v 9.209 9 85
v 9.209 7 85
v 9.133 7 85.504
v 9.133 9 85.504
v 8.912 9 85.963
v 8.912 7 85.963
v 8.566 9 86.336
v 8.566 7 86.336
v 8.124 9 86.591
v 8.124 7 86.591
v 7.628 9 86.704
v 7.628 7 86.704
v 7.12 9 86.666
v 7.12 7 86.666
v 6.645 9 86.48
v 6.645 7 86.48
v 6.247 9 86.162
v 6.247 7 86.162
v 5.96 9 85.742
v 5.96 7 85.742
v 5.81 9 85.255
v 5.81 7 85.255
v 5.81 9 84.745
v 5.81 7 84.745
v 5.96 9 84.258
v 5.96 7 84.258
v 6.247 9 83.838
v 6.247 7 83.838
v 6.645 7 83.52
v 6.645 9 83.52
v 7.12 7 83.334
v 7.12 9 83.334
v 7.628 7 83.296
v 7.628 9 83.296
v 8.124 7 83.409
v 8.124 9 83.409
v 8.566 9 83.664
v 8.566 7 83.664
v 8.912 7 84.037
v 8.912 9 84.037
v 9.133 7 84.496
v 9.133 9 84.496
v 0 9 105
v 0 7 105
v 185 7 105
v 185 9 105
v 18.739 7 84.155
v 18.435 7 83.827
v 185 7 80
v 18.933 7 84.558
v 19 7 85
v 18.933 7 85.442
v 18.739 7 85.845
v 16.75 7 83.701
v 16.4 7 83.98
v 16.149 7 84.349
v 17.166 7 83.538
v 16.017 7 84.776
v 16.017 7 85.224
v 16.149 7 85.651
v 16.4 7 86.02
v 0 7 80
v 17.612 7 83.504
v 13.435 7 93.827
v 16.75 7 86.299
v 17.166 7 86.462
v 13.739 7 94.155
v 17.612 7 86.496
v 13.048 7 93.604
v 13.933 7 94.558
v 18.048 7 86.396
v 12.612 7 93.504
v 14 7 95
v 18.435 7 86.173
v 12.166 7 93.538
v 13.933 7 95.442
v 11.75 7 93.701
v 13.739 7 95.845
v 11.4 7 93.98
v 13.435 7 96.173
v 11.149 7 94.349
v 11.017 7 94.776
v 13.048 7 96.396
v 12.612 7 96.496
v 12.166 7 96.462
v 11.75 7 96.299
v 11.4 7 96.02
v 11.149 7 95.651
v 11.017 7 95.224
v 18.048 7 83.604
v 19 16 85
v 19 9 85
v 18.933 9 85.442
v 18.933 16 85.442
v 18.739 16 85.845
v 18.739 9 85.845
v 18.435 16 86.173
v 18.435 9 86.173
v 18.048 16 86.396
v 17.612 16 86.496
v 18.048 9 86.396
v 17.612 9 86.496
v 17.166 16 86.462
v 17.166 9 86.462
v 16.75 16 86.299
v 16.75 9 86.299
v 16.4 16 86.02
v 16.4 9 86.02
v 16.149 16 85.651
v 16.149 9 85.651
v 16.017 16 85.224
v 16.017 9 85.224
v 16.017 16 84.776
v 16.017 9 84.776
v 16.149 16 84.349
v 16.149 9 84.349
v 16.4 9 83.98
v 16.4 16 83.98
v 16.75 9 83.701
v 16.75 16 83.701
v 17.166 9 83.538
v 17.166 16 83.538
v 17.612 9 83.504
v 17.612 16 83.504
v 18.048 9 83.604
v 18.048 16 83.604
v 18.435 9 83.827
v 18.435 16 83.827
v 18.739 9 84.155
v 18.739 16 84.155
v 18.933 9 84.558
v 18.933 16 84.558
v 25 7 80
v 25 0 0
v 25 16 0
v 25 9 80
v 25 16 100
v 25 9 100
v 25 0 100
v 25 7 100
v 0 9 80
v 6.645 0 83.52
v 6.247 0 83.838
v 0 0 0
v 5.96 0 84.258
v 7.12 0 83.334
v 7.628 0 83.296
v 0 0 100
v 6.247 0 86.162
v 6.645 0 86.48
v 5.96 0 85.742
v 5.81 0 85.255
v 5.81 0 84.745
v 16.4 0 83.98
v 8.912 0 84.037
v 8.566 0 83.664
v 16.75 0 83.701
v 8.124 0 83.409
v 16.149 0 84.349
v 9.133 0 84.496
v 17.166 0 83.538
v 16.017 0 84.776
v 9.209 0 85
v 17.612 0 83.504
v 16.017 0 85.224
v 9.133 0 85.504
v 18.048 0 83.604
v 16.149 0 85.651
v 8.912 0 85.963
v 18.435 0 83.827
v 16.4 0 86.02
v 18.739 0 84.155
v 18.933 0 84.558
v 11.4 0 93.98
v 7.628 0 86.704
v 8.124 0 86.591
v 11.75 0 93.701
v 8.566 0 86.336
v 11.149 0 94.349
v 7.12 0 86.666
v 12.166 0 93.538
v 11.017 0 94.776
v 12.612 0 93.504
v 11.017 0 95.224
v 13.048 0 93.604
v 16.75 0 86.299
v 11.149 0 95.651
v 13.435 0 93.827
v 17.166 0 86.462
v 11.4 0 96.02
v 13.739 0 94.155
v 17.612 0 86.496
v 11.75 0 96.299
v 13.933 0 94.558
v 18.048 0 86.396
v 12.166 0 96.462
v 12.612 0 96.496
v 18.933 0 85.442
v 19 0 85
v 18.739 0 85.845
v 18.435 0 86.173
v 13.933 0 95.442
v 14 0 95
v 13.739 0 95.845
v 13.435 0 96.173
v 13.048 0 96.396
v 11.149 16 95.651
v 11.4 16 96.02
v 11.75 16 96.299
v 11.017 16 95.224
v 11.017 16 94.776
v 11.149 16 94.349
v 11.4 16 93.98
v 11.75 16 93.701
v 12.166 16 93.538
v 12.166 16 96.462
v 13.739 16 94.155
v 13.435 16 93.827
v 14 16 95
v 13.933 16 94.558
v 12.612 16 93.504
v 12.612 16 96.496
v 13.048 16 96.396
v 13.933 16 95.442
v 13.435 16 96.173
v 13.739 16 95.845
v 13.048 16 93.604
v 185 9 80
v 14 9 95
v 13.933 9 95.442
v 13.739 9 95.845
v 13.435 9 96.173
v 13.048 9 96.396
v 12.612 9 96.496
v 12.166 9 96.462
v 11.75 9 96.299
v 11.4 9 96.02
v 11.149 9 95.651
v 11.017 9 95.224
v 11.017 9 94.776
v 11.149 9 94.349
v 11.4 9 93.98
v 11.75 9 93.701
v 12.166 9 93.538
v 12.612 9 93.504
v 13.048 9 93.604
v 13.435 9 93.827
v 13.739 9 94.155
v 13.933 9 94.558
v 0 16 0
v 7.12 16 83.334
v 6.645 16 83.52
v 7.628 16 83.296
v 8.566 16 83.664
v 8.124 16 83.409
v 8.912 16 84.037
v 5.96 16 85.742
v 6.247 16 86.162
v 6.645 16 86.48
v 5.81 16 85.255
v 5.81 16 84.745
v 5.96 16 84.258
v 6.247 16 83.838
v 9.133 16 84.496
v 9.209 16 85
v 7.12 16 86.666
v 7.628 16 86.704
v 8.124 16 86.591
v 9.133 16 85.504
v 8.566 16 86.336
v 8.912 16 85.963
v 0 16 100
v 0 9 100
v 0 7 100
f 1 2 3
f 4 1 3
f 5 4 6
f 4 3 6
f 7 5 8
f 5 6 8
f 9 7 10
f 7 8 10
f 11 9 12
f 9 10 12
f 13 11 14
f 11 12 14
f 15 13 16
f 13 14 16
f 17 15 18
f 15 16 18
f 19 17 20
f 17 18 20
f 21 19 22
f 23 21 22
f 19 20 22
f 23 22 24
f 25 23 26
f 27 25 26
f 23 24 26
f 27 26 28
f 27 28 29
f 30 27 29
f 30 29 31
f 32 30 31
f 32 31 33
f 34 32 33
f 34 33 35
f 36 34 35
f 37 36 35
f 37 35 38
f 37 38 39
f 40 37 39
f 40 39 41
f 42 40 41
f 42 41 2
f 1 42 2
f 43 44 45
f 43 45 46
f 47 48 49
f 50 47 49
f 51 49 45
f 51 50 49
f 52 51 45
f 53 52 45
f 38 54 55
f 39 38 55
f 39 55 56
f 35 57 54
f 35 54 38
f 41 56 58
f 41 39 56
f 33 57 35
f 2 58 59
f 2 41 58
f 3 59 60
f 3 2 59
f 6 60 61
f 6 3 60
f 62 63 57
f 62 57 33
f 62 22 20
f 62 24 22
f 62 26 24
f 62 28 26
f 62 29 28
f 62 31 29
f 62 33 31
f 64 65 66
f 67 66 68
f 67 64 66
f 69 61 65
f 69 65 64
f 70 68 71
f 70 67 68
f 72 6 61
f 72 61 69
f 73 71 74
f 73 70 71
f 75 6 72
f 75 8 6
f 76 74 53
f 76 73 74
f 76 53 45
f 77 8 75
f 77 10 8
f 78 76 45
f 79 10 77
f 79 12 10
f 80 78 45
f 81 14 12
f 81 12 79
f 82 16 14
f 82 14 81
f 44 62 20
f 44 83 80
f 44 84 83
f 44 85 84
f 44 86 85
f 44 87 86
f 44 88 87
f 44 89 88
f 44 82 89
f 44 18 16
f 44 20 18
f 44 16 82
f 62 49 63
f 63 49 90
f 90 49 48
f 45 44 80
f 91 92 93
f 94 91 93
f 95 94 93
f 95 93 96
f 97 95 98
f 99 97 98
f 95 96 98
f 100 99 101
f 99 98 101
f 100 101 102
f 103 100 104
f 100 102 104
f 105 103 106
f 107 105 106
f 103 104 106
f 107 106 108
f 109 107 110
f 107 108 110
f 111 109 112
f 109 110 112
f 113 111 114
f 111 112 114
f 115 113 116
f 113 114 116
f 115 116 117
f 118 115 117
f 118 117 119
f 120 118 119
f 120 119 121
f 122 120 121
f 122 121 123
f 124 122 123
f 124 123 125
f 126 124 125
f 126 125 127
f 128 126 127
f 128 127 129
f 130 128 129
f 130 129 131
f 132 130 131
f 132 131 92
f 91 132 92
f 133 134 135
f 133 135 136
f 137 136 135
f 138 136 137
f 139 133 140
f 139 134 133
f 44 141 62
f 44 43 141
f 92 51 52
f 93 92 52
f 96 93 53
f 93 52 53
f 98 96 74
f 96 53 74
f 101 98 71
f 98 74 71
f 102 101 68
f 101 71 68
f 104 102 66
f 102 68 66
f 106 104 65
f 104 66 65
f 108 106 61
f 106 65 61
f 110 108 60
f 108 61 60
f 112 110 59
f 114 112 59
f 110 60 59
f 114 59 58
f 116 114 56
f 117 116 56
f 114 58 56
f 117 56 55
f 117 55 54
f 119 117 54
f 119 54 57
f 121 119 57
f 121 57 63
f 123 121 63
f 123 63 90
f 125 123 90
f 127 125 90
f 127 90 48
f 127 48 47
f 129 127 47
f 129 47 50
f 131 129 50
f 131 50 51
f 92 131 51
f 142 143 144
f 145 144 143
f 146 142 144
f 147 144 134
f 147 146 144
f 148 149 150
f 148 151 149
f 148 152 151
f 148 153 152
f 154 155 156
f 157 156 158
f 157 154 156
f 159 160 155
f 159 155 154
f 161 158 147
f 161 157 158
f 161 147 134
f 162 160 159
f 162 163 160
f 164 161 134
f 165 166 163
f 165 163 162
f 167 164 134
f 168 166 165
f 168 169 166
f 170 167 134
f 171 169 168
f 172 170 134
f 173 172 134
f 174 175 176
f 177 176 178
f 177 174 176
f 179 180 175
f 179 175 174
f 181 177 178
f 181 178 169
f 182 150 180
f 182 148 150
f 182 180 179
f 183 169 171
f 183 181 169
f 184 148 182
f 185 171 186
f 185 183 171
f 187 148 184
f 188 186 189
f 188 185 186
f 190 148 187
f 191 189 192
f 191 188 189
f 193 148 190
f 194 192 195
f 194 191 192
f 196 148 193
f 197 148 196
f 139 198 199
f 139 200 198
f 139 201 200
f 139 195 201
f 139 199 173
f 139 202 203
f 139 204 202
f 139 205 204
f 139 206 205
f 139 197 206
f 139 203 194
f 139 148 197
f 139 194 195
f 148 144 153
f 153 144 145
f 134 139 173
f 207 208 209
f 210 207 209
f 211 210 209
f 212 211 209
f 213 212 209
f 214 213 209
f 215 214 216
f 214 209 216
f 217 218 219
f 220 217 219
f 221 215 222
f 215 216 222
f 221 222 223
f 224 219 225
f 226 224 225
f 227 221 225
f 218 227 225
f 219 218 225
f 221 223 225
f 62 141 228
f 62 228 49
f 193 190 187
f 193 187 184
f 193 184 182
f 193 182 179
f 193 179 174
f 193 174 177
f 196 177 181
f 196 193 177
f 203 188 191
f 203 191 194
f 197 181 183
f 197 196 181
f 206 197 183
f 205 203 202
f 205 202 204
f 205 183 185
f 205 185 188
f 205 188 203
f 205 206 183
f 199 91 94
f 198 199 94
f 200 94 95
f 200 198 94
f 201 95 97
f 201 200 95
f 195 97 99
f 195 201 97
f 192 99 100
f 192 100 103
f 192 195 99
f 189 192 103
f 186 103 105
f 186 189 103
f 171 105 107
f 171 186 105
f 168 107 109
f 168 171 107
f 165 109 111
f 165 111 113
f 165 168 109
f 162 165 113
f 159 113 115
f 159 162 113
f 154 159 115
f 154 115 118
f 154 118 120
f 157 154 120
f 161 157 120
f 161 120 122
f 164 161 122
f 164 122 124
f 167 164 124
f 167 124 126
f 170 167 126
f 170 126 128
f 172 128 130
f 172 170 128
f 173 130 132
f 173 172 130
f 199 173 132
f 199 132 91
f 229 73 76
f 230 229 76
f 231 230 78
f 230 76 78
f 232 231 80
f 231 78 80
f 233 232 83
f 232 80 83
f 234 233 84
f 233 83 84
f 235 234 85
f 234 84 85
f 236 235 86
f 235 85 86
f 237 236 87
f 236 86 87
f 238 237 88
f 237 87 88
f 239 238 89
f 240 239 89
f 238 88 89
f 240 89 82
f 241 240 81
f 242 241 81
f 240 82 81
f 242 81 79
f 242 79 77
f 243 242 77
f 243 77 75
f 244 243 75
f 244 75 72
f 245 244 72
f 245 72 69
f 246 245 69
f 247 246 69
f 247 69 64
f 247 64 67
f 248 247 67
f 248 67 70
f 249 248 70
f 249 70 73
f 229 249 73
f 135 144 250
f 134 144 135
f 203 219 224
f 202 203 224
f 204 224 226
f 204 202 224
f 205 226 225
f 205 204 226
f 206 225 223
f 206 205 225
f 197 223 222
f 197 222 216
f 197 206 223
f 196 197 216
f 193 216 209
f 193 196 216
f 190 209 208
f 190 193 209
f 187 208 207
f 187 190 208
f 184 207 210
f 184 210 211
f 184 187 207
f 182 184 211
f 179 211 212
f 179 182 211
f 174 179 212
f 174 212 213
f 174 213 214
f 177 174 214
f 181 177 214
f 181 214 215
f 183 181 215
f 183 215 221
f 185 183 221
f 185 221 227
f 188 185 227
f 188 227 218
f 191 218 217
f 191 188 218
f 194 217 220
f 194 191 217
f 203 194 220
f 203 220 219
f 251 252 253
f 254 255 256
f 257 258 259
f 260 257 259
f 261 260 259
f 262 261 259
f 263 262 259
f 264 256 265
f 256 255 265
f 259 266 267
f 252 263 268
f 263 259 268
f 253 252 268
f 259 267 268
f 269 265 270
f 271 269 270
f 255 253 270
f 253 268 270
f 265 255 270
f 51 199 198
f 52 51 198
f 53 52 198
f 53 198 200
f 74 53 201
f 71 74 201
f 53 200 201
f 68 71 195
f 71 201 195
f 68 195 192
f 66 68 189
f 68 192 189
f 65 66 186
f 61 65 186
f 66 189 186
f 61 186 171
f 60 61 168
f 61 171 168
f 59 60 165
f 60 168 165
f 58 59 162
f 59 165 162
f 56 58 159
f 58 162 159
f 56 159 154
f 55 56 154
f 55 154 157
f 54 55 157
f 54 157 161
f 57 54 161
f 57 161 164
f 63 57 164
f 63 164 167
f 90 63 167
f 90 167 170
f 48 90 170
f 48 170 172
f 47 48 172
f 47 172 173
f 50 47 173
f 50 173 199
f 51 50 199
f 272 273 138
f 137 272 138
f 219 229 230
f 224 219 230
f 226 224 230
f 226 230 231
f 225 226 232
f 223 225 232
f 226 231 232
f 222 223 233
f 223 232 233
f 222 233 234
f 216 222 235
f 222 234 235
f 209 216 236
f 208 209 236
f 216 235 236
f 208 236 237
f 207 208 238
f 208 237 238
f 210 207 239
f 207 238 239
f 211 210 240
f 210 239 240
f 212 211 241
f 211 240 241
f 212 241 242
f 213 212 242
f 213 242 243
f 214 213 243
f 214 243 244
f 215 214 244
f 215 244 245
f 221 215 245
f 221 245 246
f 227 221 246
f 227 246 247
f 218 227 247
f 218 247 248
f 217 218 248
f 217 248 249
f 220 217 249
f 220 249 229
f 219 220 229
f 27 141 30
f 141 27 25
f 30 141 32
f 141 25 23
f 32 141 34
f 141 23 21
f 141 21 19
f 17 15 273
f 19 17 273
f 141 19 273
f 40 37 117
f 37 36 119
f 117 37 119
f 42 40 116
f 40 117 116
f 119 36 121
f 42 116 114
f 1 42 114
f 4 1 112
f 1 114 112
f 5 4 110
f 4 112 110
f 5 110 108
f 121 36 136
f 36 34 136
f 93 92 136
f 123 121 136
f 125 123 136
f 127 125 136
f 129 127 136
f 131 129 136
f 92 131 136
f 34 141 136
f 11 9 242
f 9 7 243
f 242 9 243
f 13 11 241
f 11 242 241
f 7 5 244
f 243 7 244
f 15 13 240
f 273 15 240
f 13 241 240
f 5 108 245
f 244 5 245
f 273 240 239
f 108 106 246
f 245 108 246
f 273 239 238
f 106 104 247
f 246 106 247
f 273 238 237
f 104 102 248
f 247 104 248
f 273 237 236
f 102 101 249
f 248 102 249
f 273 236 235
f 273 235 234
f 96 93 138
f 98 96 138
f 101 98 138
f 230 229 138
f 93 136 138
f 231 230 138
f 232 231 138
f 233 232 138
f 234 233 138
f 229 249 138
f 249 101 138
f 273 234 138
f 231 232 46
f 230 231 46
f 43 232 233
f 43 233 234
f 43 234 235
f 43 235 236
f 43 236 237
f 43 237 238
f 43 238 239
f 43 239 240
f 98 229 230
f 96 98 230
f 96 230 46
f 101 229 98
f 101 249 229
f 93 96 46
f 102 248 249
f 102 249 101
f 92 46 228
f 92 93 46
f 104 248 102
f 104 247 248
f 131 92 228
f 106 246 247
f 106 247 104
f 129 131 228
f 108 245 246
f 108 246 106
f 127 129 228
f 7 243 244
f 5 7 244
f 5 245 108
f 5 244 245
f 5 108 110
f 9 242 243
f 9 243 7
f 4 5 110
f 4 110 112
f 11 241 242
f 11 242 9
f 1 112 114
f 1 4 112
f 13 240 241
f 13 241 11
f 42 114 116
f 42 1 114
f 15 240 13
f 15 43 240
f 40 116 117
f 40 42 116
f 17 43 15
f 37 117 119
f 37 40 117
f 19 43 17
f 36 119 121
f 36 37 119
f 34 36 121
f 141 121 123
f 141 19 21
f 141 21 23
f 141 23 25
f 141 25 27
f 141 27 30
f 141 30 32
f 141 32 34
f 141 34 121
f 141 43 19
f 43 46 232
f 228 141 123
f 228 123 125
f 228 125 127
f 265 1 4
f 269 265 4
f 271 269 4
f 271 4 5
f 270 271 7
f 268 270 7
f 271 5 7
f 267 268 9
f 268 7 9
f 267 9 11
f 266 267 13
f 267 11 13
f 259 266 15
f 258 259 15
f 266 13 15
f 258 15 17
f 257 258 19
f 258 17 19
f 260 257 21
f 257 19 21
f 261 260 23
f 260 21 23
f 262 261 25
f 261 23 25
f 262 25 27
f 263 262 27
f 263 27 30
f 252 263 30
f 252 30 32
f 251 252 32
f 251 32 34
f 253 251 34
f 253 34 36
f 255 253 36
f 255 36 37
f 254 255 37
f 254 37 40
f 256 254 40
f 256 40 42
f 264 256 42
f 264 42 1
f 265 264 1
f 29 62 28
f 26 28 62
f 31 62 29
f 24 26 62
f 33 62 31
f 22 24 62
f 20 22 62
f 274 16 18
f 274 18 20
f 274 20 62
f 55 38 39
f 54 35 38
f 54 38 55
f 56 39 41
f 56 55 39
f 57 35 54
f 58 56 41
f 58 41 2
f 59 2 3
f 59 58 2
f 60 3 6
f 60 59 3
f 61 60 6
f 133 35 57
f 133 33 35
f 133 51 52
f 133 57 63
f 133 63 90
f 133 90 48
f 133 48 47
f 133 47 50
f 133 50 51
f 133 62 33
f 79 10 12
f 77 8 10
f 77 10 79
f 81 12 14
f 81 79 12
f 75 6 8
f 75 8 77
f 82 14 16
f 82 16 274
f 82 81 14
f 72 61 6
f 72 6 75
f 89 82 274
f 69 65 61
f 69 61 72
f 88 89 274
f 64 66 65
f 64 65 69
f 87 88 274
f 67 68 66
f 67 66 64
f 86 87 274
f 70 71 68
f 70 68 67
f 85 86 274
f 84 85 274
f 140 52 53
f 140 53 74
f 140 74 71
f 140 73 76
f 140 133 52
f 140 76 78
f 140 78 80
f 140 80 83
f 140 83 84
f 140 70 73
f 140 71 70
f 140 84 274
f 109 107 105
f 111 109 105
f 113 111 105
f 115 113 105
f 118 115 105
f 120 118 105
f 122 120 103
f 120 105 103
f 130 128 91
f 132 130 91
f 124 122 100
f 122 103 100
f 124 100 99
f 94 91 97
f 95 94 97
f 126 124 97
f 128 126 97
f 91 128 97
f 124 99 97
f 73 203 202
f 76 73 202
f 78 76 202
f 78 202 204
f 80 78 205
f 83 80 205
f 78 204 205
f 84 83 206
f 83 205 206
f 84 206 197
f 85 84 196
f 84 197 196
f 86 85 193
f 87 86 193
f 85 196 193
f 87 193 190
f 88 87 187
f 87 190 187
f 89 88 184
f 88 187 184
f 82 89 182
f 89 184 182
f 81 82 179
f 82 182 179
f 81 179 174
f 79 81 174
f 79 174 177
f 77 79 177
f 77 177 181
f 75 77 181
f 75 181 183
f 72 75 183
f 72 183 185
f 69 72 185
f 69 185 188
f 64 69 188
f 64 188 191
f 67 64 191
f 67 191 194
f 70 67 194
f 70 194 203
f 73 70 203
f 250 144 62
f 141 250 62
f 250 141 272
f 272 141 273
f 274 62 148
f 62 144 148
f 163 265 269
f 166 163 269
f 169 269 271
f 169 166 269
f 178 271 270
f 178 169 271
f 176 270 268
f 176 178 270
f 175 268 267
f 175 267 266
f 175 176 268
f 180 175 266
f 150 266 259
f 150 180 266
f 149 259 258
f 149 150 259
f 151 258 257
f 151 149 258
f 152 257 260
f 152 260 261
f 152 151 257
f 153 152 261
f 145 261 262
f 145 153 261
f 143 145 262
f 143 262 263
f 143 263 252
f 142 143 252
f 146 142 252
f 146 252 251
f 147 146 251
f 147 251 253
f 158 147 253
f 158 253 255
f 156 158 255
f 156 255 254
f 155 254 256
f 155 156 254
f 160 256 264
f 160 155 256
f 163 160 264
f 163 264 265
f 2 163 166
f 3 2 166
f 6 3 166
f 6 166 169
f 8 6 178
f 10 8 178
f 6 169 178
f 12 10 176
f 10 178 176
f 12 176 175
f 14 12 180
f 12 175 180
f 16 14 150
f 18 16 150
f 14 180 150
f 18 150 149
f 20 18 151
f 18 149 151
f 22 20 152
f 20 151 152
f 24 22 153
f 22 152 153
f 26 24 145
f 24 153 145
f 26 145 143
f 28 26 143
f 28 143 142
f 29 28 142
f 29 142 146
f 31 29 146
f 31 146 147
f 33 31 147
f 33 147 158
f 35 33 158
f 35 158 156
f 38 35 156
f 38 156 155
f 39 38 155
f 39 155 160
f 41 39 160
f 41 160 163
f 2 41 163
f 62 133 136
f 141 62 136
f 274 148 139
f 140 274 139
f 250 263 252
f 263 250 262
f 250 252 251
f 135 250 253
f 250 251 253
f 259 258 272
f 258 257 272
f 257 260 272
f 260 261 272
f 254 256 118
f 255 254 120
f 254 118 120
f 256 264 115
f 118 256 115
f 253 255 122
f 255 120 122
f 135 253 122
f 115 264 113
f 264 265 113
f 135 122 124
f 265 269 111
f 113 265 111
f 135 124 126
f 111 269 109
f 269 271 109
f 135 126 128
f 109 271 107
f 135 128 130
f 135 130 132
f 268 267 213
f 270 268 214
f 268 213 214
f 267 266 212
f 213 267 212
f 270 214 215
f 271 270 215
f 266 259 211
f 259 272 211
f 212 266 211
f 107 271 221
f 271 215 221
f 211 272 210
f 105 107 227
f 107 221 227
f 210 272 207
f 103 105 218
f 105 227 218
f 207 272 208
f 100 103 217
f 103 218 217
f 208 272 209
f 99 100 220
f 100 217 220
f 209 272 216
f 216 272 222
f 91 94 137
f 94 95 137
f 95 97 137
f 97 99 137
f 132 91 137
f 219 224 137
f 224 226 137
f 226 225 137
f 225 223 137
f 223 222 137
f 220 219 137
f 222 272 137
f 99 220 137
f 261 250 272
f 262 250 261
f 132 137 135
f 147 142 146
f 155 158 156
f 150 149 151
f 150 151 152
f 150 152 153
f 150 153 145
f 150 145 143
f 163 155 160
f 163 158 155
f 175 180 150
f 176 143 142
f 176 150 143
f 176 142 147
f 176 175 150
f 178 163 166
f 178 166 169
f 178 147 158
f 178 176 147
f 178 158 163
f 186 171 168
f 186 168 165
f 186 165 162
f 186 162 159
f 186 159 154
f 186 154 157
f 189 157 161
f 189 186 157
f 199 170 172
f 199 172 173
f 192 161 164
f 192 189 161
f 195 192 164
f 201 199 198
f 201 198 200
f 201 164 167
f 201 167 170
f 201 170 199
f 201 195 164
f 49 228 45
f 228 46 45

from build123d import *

# Parameters (mm, degrees)
F0_W     = 25
F0_H     = 100
F1_DEPTH = 16
F2_W     = 2
F2_H     = 20
F3_DEPTH = 25
F5_DEPTH = 185
F6_R     = 1.5
F6_R_2   = 1.709082
F7_DEPTH = 16
F8_R     = 1.5
F8_R_2   = 1.709082
F9_DEPTH = 16


with BuildPart() as f1:
    # F0 (on Front) → F1 (new body)
    with BuildSketch(Plane.XZ):
        with Locations((12.5, 50)):
            Rectangle(F0_W, F0_H)
    extrude(amount=-F1_DEPTH)

    # F2 (on face) → F3 (cut, through all)
    with BuildSketch(Plane.YZ.offset(25)):
        with Locations((8, 90)):
            Rectangle(F2_W, F2_H)
    extrude(amount=-F3_DEPTH, mode=Mode.SUBTRACT)


with BuildPart() as f5:
    # F4 (on face) → F5 (new body)
    with BuildSketch(Plane(origin=(0, 0, 0), x_dir=(0, -1, 0), z_dir=(-1, 0, 0))):
        Polygon((-9, 100), (-9, 80), (-7, 80), (-7, 100), (-7, 105), (-9, 105), align=None)
    extrude(amount=-F5_DEPTH)


with BuildPart() as f7_tool:
    # F6 (on face) → F7 (new body, through all)
    with BuildSketch(Plane.XZ):
        with Locations((12.5, 95)):
            Circle(F6_R)
        with Locations((17.5, 85)):
            Circle(F6_R)
        with Locations((7.5, 85)):
            Circle(F6_R_2)
    extrude(amount=-F7_DEPTH)


with BuildPart() as f1_1:
    add(f1.part)

    # F7: cut by f7_tool
    add(f7_tool.part, mode=Mode.SUBTRACT)


with BuildPart() as f5_1:
    add(f5.part)

    # F7: cut by f7_tool
    add(f7_tool.part, mode=Mode.SUBTRACT)


with BuildPart() as f9:
    # F8 (on face) → F9 (new body, through all)
    with BuildSketch(Plane.XZ):
        with Locations((12.5, 95)):
            Circle(F8_R)
        with Locations((7.5, 85)):
            Circle(F8_R_2)
        with Locations((17.5, 85)):
            Circle(F8_R)
    extrude(amount=-F9_DEPTH)


solid = Compound([f1_1.part, f5_1.part, f9.part])
